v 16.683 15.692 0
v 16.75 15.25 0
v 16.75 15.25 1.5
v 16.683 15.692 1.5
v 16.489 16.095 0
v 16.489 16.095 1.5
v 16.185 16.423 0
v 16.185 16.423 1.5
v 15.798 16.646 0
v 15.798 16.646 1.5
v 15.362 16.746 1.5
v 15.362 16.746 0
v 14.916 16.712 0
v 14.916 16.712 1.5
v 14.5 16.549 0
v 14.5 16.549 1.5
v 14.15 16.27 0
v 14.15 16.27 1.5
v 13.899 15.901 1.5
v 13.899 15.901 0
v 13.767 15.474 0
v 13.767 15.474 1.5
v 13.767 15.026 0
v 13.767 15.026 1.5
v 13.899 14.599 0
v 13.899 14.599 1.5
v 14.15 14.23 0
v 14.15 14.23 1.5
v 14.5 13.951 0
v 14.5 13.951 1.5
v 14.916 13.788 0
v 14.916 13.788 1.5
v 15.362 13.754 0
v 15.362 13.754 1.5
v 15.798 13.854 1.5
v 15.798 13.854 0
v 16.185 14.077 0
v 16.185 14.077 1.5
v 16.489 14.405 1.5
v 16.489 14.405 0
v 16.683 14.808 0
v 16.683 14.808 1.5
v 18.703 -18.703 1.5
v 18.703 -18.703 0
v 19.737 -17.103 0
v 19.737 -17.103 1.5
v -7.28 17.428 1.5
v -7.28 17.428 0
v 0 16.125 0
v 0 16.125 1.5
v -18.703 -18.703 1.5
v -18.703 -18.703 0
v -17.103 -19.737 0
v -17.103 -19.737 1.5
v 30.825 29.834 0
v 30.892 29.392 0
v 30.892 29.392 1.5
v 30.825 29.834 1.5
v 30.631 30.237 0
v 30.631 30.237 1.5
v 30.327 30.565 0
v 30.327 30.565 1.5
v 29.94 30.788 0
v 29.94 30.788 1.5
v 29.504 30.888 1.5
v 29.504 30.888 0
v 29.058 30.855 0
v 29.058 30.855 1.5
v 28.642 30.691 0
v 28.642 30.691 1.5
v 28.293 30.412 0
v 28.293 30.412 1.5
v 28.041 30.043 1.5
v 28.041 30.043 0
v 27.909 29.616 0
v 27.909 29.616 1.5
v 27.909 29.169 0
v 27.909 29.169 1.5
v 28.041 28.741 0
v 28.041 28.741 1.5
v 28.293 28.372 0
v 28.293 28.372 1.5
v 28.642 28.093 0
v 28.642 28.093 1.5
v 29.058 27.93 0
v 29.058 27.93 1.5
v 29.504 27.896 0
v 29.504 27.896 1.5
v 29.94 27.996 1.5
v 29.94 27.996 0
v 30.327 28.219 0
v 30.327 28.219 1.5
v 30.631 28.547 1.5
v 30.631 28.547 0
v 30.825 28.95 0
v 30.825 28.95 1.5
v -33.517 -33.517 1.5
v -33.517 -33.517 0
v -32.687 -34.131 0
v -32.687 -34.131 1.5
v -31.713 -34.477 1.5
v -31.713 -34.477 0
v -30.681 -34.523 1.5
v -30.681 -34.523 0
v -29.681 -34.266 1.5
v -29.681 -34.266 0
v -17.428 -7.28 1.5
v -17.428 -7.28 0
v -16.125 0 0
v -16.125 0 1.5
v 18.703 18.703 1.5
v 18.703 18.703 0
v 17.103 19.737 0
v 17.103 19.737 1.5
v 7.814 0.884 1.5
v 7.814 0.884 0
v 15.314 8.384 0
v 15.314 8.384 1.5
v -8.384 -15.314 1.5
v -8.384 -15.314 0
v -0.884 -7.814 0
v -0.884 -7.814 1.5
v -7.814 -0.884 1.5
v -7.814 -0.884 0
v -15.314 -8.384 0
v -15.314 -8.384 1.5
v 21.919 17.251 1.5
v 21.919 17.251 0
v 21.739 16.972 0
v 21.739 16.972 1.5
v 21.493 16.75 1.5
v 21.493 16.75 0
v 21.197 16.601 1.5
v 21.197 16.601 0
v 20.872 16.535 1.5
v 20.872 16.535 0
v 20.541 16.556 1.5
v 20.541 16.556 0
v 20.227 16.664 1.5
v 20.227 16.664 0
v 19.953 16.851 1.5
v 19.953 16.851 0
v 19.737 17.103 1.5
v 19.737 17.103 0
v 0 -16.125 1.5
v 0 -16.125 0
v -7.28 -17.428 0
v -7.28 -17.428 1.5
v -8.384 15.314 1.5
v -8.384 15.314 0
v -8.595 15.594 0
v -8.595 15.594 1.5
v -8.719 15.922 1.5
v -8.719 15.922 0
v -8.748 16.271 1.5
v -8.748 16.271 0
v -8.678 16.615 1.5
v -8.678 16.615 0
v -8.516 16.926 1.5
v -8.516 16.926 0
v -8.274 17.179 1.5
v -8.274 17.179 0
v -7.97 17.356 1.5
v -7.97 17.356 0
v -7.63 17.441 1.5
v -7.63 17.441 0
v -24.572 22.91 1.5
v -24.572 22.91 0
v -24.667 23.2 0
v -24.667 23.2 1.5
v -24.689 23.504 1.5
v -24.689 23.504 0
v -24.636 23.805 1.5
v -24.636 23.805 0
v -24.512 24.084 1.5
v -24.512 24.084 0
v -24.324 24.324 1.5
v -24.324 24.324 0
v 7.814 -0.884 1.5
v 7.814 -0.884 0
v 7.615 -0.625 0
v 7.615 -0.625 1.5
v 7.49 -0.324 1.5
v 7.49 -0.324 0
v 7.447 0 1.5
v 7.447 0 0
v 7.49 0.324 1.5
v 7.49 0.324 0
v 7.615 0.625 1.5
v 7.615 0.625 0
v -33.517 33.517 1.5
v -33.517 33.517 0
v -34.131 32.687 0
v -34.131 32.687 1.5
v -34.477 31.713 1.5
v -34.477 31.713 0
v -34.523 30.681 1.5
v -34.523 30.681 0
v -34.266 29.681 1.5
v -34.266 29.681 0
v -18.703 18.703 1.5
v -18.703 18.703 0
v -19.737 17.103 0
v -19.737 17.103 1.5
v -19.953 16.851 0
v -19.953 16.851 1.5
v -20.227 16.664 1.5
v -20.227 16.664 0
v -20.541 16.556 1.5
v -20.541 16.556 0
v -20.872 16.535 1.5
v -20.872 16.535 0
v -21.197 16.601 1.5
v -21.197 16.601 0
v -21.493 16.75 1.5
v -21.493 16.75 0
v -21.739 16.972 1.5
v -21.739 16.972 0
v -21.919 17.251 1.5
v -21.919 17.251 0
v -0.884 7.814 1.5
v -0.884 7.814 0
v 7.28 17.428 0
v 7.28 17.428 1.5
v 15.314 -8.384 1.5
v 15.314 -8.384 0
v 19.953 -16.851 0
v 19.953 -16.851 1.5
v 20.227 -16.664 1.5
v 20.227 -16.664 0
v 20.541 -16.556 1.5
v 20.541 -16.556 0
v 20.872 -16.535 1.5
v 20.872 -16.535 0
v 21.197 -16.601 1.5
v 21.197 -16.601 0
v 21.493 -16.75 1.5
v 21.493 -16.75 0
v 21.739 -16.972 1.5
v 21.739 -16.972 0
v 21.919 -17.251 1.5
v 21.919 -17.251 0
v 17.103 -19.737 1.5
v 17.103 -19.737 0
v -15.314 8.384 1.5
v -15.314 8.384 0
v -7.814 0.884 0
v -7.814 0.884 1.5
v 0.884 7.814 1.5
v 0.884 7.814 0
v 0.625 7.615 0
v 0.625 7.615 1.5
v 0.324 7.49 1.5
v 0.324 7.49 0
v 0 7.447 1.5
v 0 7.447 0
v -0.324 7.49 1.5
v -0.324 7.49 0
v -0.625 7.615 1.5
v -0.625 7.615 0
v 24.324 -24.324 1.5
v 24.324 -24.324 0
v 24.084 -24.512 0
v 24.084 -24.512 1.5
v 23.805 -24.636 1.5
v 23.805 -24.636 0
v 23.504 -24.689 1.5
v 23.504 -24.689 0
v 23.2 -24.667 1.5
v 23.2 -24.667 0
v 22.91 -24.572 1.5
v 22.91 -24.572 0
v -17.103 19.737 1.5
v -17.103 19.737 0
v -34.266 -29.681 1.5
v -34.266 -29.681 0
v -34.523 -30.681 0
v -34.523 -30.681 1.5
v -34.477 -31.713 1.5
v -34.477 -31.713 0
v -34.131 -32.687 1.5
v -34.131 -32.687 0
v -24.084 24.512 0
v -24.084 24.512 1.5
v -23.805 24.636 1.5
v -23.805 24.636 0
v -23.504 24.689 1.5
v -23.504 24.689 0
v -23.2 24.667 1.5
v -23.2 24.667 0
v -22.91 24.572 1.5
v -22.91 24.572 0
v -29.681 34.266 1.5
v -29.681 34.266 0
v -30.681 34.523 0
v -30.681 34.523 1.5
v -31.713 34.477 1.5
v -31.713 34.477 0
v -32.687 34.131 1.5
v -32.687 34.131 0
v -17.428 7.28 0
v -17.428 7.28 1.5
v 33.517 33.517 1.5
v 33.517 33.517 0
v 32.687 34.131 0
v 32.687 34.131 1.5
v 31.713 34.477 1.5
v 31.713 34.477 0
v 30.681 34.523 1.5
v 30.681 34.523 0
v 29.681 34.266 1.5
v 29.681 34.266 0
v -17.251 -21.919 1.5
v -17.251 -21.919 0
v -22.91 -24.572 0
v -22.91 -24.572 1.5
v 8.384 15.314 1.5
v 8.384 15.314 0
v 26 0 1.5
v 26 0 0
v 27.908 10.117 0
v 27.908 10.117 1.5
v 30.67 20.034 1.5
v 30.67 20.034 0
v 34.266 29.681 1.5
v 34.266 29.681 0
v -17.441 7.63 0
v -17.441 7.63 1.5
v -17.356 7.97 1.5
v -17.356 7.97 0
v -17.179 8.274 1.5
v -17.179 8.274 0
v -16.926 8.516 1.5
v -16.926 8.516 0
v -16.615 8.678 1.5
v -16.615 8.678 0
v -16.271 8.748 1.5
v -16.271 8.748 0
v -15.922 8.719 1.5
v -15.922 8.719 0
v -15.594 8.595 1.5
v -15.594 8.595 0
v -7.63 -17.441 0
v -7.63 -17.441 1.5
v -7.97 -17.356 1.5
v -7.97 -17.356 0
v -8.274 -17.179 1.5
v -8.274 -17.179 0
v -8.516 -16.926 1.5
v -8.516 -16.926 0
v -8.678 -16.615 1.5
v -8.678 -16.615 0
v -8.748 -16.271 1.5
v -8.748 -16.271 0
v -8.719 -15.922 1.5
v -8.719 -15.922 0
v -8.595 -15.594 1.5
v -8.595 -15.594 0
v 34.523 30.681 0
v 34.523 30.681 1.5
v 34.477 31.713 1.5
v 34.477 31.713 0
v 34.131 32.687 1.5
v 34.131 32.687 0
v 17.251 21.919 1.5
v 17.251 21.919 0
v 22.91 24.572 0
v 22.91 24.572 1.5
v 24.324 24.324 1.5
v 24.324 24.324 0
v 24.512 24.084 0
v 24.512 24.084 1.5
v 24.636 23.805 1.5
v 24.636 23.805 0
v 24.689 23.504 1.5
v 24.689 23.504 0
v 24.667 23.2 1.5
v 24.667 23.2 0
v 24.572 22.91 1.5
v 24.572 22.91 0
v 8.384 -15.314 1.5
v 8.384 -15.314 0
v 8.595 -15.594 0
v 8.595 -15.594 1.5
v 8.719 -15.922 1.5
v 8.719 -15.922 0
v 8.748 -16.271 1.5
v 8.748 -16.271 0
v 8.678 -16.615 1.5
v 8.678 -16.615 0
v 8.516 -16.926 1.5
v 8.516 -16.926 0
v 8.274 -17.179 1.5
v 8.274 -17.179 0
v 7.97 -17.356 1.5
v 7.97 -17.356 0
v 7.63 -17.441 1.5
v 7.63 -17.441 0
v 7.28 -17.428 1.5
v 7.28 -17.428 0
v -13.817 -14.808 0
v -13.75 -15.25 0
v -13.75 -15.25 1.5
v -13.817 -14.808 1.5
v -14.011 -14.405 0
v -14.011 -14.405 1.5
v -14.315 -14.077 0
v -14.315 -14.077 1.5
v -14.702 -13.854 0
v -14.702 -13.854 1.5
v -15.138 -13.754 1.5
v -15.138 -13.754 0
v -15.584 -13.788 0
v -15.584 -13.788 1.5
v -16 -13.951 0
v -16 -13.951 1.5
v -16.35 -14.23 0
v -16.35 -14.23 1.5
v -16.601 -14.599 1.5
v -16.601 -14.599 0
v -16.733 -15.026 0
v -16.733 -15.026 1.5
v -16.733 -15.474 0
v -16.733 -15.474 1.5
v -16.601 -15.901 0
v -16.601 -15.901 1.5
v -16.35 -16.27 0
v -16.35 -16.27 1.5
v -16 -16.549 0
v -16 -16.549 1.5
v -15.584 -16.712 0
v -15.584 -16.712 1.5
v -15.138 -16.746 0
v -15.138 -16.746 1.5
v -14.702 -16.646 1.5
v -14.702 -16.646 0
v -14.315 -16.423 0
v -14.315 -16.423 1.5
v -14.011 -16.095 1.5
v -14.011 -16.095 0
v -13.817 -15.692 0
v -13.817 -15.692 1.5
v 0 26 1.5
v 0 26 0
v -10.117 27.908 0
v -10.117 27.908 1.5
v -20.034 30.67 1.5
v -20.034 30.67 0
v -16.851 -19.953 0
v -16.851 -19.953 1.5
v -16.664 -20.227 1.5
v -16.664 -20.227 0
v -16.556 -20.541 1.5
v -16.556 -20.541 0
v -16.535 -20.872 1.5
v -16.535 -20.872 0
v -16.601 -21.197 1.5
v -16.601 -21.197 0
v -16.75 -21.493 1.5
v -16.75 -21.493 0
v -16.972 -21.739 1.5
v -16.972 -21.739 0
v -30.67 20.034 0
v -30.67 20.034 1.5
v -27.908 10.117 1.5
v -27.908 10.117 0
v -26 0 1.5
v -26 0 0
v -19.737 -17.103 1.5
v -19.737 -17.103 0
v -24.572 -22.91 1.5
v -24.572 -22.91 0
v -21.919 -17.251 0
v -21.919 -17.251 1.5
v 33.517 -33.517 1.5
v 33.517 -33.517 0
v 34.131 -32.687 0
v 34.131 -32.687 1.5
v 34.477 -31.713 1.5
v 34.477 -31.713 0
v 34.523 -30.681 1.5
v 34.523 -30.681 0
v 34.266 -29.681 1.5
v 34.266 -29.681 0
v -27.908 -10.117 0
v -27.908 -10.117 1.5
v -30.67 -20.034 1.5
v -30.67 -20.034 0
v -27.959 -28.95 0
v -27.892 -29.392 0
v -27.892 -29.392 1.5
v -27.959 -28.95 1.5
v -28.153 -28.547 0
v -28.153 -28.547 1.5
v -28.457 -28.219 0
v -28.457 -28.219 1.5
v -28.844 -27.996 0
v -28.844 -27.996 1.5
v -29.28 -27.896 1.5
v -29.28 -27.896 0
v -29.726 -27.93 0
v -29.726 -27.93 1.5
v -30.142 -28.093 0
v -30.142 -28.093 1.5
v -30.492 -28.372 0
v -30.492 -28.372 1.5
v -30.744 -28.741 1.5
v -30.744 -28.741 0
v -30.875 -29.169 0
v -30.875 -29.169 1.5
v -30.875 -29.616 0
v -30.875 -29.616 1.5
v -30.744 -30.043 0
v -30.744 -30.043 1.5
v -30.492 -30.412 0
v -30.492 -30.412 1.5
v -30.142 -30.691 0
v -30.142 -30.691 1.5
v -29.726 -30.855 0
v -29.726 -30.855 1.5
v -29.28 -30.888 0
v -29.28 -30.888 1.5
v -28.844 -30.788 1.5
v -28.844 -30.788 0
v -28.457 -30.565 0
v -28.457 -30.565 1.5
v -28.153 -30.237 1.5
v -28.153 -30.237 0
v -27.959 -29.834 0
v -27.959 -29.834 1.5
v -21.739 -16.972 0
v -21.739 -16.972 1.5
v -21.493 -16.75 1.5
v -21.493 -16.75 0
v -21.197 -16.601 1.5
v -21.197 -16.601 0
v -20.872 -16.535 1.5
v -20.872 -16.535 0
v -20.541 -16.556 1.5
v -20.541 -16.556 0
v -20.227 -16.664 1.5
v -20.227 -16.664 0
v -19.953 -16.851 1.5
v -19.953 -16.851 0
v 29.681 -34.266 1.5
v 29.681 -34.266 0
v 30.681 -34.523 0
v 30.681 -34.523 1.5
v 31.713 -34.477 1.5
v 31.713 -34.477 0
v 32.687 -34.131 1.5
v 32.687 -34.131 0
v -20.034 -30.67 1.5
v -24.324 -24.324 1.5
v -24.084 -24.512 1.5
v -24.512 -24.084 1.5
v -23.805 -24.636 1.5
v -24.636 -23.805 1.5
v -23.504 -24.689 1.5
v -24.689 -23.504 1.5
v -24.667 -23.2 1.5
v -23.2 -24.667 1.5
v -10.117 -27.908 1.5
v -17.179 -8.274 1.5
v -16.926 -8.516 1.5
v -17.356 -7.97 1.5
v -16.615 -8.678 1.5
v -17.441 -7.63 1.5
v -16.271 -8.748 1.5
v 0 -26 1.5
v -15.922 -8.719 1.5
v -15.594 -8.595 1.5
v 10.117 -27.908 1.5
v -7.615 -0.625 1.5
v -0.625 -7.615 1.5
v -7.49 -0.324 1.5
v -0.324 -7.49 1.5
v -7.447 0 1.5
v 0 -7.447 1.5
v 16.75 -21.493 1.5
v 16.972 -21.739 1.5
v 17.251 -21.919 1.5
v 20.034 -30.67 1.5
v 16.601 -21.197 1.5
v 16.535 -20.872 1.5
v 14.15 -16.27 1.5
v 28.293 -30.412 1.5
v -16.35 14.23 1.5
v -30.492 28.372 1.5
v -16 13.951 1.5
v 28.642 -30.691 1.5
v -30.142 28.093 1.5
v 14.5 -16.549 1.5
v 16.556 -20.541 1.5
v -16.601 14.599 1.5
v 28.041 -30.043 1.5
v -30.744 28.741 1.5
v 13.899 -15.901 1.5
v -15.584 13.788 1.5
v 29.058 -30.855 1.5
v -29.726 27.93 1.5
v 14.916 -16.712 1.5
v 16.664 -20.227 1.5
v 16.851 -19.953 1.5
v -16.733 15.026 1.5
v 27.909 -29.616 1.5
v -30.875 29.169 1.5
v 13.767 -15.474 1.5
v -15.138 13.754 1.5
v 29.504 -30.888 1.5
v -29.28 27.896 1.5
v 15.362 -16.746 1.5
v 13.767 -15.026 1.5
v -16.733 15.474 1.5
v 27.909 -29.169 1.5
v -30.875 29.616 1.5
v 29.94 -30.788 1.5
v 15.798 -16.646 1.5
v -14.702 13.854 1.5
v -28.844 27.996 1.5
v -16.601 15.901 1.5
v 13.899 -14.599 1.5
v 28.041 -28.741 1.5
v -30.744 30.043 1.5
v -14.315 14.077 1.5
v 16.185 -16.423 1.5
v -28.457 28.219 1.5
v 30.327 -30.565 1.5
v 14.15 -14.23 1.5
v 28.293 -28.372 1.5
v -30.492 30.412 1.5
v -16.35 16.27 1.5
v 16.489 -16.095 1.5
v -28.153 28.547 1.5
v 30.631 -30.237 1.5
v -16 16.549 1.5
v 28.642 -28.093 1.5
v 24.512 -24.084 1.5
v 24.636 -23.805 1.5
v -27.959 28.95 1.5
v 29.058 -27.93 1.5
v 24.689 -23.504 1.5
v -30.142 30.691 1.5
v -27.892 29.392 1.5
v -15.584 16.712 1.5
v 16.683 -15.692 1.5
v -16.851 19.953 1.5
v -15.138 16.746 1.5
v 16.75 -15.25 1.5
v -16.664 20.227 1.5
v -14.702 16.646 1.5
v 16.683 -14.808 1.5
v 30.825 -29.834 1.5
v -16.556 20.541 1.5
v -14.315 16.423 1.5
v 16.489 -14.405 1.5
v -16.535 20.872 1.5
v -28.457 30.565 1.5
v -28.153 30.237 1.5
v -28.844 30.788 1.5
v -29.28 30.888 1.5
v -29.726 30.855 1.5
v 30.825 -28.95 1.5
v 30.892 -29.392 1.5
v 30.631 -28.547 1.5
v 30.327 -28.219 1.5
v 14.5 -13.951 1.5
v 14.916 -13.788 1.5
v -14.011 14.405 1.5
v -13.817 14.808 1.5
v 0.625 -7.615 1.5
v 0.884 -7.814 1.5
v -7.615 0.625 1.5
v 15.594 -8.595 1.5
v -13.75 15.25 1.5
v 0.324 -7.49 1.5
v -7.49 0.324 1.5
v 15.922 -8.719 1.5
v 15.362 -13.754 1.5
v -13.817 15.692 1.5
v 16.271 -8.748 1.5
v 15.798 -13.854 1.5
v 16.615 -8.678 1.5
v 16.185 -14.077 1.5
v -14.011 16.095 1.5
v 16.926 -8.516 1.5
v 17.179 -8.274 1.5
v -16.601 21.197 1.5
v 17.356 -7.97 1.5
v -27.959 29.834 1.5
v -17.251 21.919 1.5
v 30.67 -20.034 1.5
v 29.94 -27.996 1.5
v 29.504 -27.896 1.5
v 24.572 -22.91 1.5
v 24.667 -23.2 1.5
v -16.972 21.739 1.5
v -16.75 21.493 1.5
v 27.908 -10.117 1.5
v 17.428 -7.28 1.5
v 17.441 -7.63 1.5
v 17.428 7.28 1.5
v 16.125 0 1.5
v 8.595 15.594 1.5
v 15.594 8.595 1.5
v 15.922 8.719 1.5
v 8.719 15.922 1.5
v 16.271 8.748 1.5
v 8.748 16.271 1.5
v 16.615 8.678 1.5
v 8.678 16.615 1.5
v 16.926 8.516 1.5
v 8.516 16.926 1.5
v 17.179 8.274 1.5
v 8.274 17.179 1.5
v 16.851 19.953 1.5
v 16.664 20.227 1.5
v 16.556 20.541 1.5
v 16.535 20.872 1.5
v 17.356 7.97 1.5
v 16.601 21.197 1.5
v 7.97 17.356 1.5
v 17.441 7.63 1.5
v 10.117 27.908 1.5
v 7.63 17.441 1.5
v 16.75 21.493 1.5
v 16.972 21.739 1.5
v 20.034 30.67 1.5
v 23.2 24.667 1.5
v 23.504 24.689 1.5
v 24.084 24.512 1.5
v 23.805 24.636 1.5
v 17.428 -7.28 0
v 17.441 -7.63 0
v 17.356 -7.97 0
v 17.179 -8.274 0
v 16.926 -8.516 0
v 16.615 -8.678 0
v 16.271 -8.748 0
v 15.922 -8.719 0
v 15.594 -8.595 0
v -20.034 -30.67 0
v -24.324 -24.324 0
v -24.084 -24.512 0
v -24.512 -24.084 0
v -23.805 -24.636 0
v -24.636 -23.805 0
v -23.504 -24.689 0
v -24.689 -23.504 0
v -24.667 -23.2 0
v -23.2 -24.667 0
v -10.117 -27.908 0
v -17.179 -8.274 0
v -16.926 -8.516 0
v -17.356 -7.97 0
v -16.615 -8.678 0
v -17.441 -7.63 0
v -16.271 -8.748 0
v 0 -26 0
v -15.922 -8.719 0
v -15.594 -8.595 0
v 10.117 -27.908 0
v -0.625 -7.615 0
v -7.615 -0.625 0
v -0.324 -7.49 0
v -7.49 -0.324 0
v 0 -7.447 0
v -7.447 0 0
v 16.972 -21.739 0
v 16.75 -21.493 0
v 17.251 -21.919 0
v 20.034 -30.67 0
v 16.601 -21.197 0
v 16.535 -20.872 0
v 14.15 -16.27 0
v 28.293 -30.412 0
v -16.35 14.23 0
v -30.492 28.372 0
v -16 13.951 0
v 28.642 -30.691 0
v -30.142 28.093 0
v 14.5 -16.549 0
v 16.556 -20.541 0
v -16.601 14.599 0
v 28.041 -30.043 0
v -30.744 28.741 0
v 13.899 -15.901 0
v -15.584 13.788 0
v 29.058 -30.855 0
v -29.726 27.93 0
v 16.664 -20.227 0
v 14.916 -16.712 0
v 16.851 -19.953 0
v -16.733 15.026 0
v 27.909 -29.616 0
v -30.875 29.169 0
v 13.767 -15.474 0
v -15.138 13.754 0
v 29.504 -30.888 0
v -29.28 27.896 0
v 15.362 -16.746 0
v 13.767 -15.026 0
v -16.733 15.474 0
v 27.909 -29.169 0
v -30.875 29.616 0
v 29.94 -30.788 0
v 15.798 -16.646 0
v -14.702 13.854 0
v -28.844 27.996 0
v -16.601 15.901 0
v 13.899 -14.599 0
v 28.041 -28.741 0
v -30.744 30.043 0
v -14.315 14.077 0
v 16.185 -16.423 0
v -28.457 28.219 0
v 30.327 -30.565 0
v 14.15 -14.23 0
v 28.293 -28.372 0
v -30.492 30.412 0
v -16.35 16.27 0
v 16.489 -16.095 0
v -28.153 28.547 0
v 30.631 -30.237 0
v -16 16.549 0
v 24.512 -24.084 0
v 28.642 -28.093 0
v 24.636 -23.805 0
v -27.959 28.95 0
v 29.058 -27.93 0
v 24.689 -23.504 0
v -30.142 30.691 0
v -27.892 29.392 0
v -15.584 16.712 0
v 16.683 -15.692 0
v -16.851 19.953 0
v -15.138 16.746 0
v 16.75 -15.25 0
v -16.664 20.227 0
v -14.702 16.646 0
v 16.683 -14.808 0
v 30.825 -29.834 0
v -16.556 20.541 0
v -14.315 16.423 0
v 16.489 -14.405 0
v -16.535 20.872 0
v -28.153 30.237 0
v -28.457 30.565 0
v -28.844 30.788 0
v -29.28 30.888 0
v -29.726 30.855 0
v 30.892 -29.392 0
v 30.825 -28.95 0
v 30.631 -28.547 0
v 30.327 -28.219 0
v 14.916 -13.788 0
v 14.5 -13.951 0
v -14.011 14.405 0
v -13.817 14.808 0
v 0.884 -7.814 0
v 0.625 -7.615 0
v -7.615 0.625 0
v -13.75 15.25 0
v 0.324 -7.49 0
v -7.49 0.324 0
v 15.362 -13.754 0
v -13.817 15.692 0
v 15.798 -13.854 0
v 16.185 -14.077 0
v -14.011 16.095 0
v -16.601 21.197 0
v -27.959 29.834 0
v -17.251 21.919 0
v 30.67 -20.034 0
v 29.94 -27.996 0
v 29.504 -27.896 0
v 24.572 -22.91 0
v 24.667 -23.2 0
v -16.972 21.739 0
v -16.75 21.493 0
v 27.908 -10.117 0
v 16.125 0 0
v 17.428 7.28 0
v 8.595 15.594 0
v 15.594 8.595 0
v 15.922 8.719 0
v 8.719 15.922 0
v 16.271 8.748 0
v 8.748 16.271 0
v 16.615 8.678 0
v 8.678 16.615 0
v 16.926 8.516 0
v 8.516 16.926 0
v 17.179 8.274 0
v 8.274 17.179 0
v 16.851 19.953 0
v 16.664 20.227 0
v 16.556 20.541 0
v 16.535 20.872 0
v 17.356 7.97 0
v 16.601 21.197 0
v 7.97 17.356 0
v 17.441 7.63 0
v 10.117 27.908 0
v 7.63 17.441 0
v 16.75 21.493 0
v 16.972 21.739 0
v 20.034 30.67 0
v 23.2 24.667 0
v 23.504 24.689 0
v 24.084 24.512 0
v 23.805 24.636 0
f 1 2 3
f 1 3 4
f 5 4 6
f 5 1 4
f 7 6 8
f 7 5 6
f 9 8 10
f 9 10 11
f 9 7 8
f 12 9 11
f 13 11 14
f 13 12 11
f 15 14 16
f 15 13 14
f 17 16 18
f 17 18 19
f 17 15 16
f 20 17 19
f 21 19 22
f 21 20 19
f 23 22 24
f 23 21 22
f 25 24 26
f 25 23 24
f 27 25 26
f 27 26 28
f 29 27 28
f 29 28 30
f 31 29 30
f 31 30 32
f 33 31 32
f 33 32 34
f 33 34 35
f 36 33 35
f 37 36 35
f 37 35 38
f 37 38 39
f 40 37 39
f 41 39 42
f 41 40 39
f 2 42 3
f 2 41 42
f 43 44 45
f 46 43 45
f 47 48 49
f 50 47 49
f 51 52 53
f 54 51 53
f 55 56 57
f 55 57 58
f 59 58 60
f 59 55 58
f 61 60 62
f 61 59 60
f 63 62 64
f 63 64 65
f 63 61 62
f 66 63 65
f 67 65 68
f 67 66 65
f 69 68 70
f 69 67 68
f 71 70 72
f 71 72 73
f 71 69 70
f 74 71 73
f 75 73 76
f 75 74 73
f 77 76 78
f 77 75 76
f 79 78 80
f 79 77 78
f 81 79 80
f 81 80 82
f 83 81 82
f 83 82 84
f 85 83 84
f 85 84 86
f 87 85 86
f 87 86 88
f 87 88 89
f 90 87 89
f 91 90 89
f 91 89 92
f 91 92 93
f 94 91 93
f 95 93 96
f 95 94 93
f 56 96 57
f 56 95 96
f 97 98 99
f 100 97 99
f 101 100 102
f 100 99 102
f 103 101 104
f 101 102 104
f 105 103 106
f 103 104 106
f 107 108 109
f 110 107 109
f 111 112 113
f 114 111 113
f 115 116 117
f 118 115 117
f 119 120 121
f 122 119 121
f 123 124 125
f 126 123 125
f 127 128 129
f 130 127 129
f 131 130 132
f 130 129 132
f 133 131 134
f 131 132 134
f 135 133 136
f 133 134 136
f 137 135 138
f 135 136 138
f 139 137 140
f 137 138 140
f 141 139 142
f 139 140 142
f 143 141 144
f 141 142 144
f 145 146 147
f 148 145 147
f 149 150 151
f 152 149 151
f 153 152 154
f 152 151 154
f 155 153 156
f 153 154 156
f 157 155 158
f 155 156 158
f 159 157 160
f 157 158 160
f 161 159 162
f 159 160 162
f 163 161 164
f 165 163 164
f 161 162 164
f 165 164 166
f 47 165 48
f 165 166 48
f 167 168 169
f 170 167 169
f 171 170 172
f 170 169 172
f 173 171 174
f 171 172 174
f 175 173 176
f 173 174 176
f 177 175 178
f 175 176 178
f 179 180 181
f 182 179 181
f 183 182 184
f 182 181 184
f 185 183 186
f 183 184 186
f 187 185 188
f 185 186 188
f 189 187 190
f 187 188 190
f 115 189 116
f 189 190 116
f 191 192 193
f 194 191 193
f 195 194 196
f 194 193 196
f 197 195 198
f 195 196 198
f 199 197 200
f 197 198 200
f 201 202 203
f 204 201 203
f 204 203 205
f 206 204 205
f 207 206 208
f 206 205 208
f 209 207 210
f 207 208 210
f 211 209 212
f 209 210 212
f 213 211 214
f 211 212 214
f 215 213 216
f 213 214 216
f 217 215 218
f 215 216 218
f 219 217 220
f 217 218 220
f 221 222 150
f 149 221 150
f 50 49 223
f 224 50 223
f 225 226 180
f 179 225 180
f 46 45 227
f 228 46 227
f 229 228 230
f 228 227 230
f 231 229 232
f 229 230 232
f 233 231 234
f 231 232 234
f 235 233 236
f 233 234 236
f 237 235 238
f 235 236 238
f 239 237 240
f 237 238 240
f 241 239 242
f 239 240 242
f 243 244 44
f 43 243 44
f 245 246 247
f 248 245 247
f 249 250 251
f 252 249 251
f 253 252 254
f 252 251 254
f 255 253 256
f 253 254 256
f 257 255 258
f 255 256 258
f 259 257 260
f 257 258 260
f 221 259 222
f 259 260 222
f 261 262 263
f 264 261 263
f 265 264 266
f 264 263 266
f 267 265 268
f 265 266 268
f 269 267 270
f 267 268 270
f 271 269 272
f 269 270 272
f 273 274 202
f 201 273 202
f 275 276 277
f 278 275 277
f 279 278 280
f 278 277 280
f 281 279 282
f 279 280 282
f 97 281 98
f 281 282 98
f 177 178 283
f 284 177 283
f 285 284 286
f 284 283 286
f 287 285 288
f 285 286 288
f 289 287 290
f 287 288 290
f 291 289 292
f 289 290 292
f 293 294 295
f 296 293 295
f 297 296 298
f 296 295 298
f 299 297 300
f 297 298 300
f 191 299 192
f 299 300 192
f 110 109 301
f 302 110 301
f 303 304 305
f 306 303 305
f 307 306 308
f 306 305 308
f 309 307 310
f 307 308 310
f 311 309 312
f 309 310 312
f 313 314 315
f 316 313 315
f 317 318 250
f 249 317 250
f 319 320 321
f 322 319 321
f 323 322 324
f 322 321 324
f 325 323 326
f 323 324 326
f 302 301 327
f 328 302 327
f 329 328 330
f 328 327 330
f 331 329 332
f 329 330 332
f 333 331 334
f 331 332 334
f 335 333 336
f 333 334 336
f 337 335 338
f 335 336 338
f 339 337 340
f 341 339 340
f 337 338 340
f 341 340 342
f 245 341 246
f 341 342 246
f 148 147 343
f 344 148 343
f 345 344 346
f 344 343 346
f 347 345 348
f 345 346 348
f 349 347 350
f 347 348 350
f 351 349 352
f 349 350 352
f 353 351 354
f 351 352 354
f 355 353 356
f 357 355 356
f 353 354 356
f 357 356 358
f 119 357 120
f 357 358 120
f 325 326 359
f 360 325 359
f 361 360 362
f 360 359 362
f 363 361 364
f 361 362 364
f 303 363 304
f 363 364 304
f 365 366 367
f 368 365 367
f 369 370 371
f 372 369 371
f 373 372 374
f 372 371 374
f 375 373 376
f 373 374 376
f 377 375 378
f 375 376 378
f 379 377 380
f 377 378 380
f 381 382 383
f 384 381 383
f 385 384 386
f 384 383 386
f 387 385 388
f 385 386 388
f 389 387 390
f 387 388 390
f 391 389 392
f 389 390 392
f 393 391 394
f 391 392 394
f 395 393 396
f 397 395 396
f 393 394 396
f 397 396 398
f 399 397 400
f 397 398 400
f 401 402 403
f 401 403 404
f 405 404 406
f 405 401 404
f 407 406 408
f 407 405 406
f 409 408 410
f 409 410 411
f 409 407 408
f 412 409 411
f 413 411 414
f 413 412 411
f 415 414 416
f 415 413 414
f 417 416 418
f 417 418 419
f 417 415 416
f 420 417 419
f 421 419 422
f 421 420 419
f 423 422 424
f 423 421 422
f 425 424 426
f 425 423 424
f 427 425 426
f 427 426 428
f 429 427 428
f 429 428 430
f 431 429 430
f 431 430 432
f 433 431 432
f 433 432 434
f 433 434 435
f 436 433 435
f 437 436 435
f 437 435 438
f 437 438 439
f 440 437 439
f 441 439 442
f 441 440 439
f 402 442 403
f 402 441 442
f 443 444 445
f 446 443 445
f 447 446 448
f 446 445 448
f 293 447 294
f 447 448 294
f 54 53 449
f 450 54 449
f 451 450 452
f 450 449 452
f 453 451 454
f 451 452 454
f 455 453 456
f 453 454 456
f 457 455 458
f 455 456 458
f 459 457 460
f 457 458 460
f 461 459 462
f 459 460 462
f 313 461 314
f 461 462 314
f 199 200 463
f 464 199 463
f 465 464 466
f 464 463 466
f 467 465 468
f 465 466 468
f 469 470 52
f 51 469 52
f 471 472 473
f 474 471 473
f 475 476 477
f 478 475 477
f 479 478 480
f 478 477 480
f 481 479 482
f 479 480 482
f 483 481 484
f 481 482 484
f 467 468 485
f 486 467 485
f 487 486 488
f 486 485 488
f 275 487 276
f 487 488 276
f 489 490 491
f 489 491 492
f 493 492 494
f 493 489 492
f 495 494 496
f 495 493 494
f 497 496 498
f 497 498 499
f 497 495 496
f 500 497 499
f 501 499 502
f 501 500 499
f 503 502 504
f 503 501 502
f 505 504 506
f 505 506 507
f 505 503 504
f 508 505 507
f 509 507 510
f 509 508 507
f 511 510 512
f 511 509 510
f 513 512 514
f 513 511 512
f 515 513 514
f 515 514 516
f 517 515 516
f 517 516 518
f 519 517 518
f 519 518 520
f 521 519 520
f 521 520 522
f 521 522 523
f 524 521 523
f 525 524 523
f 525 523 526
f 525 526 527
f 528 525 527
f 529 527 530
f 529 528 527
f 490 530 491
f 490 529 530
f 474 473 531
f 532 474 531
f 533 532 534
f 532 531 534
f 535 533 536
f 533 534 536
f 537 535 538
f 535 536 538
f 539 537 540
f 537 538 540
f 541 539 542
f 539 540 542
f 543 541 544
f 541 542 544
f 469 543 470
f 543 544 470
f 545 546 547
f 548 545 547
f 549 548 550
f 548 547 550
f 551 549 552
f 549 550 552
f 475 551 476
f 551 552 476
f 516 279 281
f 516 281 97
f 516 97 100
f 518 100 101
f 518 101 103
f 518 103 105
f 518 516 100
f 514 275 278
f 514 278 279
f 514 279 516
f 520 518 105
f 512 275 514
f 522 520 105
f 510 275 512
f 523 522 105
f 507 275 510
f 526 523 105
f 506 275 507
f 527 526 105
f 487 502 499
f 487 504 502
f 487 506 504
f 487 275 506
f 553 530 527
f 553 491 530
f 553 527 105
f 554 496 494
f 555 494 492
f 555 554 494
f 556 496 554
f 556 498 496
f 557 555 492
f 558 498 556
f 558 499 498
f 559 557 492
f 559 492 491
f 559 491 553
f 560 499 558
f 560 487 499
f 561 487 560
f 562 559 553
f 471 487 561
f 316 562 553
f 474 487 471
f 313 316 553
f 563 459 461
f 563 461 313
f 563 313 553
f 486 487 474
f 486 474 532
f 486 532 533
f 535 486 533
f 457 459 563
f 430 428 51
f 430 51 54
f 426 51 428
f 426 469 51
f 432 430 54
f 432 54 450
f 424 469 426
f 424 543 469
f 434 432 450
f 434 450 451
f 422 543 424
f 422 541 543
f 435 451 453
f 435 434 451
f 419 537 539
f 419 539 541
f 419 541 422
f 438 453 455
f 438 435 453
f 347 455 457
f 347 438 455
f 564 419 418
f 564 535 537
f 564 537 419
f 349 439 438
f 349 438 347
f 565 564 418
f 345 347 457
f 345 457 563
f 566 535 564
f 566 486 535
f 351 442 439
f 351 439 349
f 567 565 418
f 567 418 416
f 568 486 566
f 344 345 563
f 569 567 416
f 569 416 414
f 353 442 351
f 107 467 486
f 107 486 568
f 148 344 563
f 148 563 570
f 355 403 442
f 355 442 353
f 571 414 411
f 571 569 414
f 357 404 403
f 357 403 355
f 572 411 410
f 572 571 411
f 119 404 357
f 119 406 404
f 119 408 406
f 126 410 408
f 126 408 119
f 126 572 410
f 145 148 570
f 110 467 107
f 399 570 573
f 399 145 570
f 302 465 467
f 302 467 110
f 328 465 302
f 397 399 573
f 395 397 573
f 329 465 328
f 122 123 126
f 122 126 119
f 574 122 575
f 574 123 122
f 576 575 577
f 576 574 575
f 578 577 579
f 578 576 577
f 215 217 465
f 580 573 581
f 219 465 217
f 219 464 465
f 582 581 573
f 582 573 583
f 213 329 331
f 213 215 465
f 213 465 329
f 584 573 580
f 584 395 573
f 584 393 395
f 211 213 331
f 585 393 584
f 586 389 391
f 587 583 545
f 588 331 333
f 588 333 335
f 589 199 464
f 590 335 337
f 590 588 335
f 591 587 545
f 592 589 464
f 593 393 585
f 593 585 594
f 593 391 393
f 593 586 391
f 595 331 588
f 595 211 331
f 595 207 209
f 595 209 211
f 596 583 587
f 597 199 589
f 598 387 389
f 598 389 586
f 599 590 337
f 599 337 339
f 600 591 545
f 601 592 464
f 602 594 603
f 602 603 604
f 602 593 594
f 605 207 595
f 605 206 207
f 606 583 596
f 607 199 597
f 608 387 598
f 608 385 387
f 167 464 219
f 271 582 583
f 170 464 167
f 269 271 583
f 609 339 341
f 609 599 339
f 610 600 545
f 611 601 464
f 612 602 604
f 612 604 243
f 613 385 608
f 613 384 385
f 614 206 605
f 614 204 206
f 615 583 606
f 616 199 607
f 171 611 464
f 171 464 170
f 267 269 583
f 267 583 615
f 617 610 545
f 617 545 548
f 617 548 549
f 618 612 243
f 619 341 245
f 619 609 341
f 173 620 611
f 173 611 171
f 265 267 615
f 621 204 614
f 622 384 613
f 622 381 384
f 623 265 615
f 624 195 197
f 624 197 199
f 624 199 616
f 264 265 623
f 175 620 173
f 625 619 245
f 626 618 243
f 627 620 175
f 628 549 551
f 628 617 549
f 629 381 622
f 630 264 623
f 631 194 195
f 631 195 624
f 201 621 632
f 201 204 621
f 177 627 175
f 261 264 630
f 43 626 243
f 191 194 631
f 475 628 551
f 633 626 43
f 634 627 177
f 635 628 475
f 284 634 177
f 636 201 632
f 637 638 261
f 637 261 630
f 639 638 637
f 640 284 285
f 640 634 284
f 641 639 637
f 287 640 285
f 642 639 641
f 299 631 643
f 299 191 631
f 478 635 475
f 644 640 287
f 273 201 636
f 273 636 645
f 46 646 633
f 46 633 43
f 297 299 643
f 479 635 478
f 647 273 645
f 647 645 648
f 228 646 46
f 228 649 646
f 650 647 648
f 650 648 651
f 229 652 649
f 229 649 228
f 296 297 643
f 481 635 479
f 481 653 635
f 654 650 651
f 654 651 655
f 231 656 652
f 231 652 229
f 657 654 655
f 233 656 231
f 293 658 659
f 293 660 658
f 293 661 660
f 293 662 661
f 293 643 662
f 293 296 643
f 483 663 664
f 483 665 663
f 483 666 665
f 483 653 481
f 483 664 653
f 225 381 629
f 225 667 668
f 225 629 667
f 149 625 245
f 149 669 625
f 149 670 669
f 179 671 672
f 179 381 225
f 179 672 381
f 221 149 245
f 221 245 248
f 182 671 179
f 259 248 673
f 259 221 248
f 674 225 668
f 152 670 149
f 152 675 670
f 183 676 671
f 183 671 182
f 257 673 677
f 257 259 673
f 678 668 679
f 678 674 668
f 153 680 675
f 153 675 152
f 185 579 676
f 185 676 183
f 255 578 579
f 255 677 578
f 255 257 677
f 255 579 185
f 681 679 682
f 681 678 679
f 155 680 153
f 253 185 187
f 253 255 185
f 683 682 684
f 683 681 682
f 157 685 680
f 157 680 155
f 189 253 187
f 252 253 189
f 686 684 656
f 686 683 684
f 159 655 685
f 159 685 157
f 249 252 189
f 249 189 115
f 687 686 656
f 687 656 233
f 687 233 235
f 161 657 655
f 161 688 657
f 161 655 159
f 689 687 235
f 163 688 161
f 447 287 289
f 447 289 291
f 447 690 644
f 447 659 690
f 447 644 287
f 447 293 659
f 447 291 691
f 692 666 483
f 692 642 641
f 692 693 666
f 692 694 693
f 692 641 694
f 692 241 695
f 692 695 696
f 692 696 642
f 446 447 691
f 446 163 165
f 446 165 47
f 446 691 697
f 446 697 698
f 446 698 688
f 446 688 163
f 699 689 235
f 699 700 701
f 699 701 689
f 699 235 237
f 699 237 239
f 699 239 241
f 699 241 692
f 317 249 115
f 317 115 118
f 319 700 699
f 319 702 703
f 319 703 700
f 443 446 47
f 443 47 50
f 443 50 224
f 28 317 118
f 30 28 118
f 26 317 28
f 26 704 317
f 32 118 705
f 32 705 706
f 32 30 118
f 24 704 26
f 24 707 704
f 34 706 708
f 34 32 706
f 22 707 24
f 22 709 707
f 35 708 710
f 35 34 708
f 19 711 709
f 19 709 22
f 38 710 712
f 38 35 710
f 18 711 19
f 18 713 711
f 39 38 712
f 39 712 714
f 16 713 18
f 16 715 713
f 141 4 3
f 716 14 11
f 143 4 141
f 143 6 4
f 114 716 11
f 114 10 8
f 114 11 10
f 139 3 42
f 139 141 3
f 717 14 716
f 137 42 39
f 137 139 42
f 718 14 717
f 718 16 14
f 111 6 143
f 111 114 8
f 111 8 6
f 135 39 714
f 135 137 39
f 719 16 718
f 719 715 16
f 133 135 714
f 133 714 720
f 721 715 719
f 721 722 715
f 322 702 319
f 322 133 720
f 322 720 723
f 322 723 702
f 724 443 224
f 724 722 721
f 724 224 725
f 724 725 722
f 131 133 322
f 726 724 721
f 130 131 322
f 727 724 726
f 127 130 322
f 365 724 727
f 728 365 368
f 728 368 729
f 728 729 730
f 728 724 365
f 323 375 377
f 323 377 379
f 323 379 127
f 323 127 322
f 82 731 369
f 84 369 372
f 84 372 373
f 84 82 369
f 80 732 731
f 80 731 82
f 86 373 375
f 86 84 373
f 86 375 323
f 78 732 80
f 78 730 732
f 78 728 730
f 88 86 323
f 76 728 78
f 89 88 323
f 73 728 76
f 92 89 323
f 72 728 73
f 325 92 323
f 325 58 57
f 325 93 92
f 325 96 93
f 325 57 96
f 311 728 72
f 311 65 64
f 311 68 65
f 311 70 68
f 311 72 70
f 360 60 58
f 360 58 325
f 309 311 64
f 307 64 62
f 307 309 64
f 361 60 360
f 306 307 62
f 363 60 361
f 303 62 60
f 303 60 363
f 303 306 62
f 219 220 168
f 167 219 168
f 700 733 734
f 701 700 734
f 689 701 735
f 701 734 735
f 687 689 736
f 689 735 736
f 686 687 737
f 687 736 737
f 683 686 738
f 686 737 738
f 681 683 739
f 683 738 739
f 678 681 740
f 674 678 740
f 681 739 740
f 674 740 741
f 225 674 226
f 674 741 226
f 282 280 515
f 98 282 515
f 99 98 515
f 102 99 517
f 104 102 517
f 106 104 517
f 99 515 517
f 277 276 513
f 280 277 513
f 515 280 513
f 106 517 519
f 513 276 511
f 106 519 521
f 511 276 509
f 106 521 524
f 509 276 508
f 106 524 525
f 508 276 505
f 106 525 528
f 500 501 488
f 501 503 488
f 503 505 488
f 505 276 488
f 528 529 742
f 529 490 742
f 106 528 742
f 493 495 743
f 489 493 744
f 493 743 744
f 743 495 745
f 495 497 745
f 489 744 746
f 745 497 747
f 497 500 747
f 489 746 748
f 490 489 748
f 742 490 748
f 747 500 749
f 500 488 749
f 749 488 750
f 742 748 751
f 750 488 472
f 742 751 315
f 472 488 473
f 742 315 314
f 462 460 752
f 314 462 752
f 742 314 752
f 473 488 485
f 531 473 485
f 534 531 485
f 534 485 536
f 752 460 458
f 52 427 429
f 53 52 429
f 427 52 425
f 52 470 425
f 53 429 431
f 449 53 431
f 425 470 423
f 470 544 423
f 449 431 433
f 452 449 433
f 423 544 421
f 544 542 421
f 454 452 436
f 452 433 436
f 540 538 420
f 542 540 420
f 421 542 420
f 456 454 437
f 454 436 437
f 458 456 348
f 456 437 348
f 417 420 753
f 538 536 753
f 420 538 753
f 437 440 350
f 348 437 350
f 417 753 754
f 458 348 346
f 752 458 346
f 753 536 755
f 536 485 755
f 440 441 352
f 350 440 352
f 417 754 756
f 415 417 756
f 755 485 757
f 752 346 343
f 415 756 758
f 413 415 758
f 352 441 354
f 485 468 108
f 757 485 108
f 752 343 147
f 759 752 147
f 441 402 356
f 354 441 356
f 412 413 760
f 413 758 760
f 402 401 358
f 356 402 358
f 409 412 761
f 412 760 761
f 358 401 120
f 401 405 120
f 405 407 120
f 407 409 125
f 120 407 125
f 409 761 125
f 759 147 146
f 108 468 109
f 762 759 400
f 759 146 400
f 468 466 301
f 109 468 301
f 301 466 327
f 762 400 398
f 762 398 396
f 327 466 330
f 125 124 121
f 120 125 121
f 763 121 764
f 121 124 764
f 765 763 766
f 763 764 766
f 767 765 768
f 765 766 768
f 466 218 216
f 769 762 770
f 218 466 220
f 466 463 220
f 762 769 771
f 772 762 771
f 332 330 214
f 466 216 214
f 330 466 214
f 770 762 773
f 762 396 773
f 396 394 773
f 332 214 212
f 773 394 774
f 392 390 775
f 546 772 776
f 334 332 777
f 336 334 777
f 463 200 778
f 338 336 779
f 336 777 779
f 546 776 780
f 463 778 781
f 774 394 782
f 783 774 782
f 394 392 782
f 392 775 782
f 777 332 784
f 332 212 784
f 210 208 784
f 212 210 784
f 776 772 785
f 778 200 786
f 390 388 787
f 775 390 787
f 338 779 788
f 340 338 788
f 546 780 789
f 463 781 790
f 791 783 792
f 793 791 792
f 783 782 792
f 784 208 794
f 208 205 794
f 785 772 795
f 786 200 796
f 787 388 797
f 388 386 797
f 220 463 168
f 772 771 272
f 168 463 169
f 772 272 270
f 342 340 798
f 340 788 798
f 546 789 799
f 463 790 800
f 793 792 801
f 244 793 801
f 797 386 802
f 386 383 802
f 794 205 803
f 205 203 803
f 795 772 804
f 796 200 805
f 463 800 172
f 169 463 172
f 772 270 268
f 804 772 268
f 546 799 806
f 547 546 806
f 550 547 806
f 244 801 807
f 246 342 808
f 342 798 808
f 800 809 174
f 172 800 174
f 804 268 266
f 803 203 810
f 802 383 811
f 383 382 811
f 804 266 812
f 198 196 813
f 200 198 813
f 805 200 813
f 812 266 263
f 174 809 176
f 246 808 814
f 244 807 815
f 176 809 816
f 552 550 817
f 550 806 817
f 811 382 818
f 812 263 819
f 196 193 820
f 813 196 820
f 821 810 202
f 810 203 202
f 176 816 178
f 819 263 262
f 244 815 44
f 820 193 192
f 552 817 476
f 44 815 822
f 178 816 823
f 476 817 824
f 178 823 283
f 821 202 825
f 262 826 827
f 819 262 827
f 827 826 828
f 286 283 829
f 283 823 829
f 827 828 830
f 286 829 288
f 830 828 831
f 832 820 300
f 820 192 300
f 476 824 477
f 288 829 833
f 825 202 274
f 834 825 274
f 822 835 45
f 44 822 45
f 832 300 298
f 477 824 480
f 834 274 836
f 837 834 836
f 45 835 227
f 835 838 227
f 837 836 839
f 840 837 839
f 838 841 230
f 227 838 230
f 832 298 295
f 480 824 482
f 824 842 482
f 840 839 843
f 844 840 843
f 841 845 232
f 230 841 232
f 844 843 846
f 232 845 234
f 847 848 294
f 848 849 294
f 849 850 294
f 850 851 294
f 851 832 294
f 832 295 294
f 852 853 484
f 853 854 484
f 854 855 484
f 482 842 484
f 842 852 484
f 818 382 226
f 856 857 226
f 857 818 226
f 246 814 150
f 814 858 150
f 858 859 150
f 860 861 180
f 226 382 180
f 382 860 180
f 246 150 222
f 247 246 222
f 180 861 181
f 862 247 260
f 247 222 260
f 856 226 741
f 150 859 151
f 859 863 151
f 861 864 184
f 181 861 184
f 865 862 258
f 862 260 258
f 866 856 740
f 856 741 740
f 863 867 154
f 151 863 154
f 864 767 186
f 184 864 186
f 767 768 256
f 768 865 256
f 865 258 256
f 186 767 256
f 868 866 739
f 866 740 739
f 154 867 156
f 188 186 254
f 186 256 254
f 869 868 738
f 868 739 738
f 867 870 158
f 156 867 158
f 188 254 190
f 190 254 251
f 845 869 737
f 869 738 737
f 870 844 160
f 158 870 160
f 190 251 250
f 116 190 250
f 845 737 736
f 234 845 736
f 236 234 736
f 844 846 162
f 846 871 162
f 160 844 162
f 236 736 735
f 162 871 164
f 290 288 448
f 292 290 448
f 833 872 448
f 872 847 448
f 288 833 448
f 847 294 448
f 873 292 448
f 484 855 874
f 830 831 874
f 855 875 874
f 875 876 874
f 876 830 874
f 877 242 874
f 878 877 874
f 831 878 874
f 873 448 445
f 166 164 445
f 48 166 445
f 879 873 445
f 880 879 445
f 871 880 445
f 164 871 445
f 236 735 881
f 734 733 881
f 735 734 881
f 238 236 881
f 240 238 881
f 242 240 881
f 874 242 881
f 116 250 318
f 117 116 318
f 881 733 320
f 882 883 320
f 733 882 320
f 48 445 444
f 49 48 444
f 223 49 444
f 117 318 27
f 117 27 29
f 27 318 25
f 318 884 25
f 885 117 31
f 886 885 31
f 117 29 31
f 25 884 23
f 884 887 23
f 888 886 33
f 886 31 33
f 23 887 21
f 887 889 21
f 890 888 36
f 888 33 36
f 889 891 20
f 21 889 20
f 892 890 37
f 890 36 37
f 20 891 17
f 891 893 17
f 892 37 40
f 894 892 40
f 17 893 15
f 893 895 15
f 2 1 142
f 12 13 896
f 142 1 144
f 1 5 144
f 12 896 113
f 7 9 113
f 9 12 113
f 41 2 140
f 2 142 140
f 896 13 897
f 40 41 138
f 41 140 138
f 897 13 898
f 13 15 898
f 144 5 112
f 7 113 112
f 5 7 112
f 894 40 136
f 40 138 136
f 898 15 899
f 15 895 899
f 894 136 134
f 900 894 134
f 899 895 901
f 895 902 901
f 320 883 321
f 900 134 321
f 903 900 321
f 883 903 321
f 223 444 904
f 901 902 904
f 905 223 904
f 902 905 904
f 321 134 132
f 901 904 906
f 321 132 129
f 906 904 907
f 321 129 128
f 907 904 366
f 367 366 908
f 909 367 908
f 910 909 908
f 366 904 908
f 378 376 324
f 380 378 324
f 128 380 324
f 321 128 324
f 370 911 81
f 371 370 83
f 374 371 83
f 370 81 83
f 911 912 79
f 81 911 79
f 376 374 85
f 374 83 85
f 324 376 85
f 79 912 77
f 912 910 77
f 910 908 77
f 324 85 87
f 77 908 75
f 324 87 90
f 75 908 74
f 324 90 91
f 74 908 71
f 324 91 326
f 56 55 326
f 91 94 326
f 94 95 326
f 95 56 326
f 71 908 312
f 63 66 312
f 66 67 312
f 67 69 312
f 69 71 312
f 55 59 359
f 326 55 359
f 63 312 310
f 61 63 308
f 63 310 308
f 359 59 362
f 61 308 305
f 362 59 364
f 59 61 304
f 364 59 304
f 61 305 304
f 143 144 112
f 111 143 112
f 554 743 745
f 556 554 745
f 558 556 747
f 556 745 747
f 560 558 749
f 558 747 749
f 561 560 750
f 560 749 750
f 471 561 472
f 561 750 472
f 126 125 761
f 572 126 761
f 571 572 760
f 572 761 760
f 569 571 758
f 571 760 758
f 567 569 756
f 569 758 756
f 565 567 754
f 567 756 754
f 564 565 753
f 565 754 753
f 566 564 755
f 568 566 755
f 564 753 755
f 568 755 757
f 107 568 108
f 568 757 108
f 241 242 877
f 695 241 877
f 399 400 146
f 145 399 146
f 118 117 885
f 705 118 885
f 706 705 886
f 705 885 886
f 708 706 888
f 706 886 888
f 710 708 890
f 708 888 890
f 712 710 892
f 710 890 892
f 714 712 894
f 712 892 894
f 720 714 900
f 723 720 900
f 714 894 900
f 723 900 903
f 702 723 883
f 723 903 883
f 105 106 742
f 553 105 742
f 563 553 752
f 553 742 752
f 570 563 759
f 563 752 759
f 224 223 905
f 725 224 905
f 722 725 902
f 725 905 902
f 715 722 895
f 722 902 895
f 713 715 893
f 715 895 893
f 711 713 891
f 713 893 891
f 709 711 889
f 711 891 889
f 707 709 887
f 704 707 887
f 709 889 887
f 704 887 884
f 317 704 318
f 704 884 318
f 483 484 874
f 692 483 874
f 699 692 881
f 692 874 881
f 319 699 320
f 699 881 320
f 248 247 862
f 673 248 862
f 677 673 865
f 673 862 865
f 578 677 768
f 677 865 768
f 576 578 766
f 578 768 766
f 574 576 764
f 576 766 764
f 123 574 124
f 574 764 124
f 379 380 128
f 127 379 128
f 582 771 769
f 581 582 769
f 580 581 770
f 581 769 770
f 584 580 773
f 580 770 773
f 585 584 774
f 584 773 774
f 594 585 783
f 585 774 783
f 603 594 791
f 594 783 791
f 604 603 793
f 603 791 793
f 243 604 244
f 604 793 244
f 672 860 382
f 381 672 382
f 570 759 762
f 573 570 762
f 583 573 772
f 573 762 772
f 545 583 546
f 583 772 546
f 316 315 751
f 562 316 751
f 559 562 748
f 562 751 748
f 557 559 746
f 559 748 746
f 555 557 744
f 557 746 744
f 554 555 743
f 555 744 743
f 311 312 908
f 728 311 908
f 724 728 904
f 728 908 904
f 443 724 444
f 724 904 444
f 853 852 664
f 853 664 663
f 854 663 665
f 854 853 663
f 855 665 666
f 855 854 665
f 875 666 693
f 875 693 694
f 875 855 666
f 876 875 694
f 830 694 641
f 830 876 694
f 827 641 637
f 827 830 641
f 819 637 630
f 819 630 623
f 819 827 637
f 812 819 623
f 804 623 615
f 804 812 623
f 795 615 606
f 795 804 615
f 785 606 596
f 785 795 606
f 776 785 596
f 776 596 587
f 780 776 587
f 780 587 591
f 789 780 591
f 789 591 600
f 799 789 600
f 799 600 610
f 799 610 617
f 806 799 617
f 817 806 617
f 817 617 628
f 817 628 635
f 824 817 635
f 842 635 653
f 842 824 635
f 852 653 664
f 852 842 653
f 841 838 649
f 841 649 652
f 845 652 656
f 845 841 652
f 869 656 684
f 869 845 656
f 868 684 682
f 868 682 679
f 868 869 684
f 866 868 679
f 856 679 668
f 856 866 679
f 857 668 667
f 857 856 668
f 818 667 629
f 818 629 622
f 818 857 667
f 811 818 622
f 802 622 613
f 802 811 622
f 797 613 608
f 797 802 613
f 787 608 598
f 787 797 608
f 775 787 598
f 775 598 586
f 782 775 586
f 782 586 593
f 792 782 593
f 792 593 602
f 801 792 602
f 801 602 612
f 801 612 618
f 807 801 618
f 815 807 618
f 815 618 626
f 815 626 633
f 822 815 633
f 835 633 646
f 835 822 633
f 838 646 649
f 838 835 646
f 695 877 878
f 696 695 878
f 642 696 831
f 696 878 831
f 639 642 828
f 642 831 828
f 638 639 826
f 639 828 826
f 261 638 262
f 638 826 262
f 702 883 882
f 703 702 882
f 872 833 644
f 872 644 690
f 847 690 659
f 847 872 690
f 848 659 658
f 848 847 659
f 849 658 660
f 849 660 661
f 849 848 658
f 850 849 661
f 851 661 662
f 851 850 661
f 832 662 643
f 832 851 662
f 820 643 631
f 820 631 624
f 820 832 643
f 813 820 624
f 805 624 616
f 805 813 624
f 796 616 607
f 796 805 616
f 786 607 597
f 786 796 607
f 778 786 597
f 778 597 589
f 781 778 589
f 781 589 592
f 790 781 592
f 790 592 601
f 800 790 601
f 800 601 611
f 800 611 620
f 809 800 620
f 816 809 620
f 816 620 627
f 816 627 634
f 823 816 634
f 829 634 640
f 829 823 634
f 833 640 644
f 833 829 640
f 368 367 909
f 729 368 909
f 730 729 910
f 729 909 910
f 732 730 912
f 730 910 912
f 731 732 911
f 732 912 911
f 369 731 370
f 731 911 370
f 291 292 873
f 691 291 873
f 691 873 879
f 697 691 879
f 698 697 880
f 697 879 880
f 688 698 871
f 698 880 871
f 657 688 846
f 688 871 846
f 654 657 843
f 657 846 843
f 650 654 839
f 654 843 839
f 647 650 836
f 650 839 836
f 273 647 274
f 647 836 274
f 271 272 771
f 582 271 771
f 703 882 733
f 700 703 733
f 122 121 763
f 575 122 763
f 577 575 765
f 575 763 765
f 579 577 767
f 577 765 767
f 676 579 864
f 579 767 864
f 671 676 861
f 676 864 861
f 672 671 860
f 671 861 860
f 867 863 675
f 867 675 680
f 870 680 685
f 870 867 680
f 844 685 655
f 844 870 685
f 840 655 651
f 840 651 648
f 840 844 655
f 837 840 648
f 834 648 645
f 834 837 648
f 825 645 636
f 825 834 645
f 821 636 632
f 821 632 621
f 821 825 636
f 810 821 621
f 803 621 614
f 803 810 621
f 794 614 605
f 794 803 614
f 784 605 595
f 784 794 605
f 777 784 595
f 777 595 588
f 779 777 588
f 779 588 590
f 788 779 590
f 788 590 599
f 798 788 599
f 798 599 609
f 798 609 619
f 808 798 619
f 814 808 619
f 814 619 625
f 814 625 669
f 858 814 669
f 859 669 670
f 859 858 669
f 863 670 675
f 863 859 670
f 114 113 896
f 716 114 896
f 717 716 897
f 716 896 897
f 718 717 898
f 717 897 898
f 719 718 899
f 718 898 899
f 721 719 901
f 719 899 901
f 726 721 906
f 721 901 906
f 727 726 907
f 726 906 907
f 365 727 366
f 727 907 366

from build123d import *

# Parameters (mm, degrees)
F0_R     = 1.5
F1_DEPTH = 1.5


with BuildPart() as f1:
    # F0 (on Top) → F1 (new body)
    with BuildSketch(Plane.XY):
        with BuildLine():
            ThreePointArc((26, 0), (29.183497, 15.104915), (34.266455, 29.680808))
            ThreePointArc((34.266455, 29.680808), (34.47702, 31.713219), (33.516861, 33.516861))
            ThreePointArc((33.516861, 33.516861), (31.713219, 34.47702), (29.680808, 34.266455))
            ThreePointArc((29.680808, 34.266455), (15.104915, 29.183497), (0, 26))
            ThreePointArc((0, 26), (-15.104915, 29.183497), (-29.680808, 34.266455))
            ThreePointArc((-29.680808, 34.266455), (-31.713219, 34.47702), (-33.516861, 33.516861))
            ThreePointArc((-33.516861, 33.516861), (-34.47702, 31.713219), (-34.266455, 29.680808))
            ThreePointArc((-34.266455, 29.680808), (-29.183497, 15.104915), (-26, 0))
            ThreePointArc((-26, 0), (-29.183497, -15.104915), (-34.266455, -29.680808))
            ThreePointArc((-34.266455, -29.680808), (-34.47702, -31.713219), (-33.516861, -33.516861))
            ThreePointArc((-33.516861, -33.516861), (-31.713219, -34.47702), (-29.680808, -34.266455))
            ThreePointArc((-29.680808, -34.266455), (-15.104915, -29.183497), (0, -26))
            ThreePointArc((0, -26), (15.104915, -29.183497), (29.680808, -34.266455))
            ThreePointArc((29.680808, -34.266455), (31.713219, -34.47702), (33.516861, -33.516861))
            ThreePointArc((33.516861, -33.516861), (34.47702, -31.713219), (34.266455, -29.680808))
            ThreePointArc((34.266455, -29.680808), (29.183497, -15.104915), (26, 0))
        make_face()
        with Locations((-29.392136, -29.392136)):
            Circle(F0_R, mode=Mode.SUBTRACT)
        with BuildLine():
            ThreePointArc((-24.324473, -24.324473), (-24.671832, -23.656327), (-24.572337, -22.909884))
            Line((-24.572337, -22.909884), (-21.918806, -17.251149))
            ThreePointArc((-21.918806, -17.251149), (-20.871666, -16.534722), (-19.73736, -17.103157))
            Line((-19.73736, -17.103157), (-18.702974, -18.702974))
            Line((-18.702974, -18.702974), (-17.103157, -19.73736))
            ThreePointArc((-17.103157, -19.73736), (-16.534722, -20.871666), (-17.251149, -21.918806))
            Line((-17.251149, -21.918806), (-22.909884, -24.572337))
            ThreePointArc((-22.909884, -24.572337), (-23.656327, -24.671832), (-24.324473, -24.324473))
        make_face(mode=Mode.SUBTRACT)
        with Locations((-15.25, -15.25)):
            Circle(F0_R, mode=Mode.SUBTRACT)
        with Locations((29.392136, -29.392136)):
            Circle(F0_R, mode=Mode.SUBTRACT)
        with BuildLine():
            Line((21.918806, -17.251149), (24.572337, -22.909884))
            ThreePointArc((24.572337, -22.909884), (24.671832, -23.656327), (24.324473, -24.324473))
            ThreePointArc((24.324473, -24.324473), (23.656327, -24.671832), (22.909884, -24.572337))
            Line((22.909884, -24.572337), (17.251149, -21.918806))
            ThreePointArc((17.251149, -21.918806), (16.534722, -20.871666), (17.103157, -19.73736))
            Line((17.103157, -19.73736), (18.702974, -18.702974))
            Line((18.702974, -18.702974), (19.73736, -17.103157))
            ThreePointArc((19.73736, -17.103157), (20.871666, -16.534722), (21.918806, -17.251149))
        make_face(mode=Mode.SUBTRACT)
        with BuildLine():
            ThreePointArc((8.383883, -15.31353), (8.608023, -16.776019), (7.279787, -17.427863))
            Line((7.279787, -17.427863), (0, -16.125))
            Line((0, -16.125), (-7.279787, -17.427863))
            ThreePointArc((-7.279787, -17.427863), (-8.608023, -16.776019), (-8.383883, -15.31353))
            Line((-8.383883, -15.31353), (-0.883883, -7.81353))
            ThreePointArc((-0.883883, -7.81353), (0, -7.447413), (0.883883, -7.81353))
            Line((0.883883, -7.81353), (8.383883, -15.31353))
        make_face(mode=Mode.SUBTRACT)
        with Locations((15.25, -15.25)):
            Circle(F0_R, mode=Mode.SUBTRACT)
        with BuildLine():
            Line((-16.125, 0), (-17.427863, 7.279787))
            ThreePointArc((-17.427863, 7.279787), (-16.776019, 8.608023), (-15.31353, 8.383883))
            Line((-15.31353, 8.383883), (-7.81353, 0.883883))
            ThreePointArc((-7.81353, 0.883883), (-7.447413, 0), (-7.81353, -0.883883))
            Line((-7.81353, -0.883883), (-15.31353, -8.383883))
            ThreePointArc((-15.31353, -8.383883), (-16.776019, -8.608023), (-17.427863, -7.279787))
            Line((-17.427863, -7.279787), (-16.125, 0))
        make_face(mode=Mode.SUBTRACT)
        with Locations((-15.25, 15.25)):
            Circle(F0_R, mode=Mode.SUBTRACT)
        with BuildLine():
            ThreePointArc((-17.251149, 21.918806), (-16.534722, 20.871666), (-17.103157, 19.73736))
            Line((-17.103157, 19.73736), (-18.702974, 18.702974))
            Line((-18.702974, 18.702974), (-19.73736, 17.103157))
            ThreePointArc((-19.73736, 17.103157), (-20.871666, 16.534722), (-21.918806, 17.251149))
            Line((-21.918806, 17.251149), (-24.572337, 22.909884))
            ThreePointArc((-24.572337, 22.909884), (-24.671832, 23.656327), (-24.324473, 24.324473))
            ThreePointArc((-24.324473, 24.324473), (-23.656327, 24.671832), (-22.909884, 24.572337))
            Line((-22.909884, 24.572337), (-17.251149, 21.918806))
        make_face(mode=Mode.SUBTRACT)
        with Locations((-29.392136, 29.392136)):
            Circle(F0_R, mode=Mode.SUBTRACT)
        with BuildLine():
            ThreePointArc((7.81353, -0.883883), (7.447413, 0), (7.81353, 0.883883))
            Line((7.81353, 0.883883), (15.31353, 8.383883))
            ThreePointArc((15.31353, 8.383883), (16.776019, 8.608023), (17.427863, 7.279787))
            Line((17.427863, 7.279787), (16.125, 0))
            Line((16.125, 0), (17.427863, -7.279787))
            ThreePointArc((17.427863, -7.279787), (16.776019, -8.608023), (15.31353, -8.383883))
            Line((15.31353, -8.383883), (7.81353, -0.883883))
        make_face(mode=Mode.SUBTRACT)
        with BuildLine():
            Line((-7.279787, 17.427863), (0, 16.125))
            Line((0, 16.125), (7.279787, 17.427863))
            ThreePointArc((7.279787, 17.427863), (8.608023, 16.776019), (8.383883, 15.31353))
            Line((8.383883, 15.31353), (0.883883, 7.81353))
            ThreePointArc((0.883883, 7.81353), (0, 7.447413), (-0.883883, 7.81353))
            Line((-0.883883, 7.81353), (-8.383883, 15.31353))
            ThreePointArc((-8.383883, 15.31353), (-8.608023, 16.776019), (-7.279787, 17.427863))
        make_face(mode=Mode.SUBTRACT)
        with Locations((15.25, 15.25)):
            Circle(F0_R, mode=Mode.SUBTRACT)
        with BuildLine():
            Line((19.73736, 17.103157), (18.702974, 18.702974))
            Line((18.702974, 18.702974), (17.103157, 19.73736))
            ThreePointArc((17.103157, 19.73736), (16.534722, 20.871666), (17.251149, 21.918806))
            Line((17.251149, 21.918806), (22.909884, 24.572337))
            ThreePointArc((22.909884, 24.572337), (23.656327, 24.671832), (24.324473, 24.324473))
            ThreePointArc((24.324473, 24.324473), (24.671832, 23.656327), (24.572337, 22.909884))
            Line((24.572337, 22.909884), (21.918806, 17.251149))
            ThreePointArc((21.918806, 17.251149), (20.871666, 16.534722), (19.73736, 17.103157))
        make_face(mode=Mode.SUBTRACT)
        with Locations((29.392136, 29.392136)):
            Circle(F0_R, mode=Mode.SUBTRACT)
    extrude(amount=F1_DEPTH)


solid = f1.part
